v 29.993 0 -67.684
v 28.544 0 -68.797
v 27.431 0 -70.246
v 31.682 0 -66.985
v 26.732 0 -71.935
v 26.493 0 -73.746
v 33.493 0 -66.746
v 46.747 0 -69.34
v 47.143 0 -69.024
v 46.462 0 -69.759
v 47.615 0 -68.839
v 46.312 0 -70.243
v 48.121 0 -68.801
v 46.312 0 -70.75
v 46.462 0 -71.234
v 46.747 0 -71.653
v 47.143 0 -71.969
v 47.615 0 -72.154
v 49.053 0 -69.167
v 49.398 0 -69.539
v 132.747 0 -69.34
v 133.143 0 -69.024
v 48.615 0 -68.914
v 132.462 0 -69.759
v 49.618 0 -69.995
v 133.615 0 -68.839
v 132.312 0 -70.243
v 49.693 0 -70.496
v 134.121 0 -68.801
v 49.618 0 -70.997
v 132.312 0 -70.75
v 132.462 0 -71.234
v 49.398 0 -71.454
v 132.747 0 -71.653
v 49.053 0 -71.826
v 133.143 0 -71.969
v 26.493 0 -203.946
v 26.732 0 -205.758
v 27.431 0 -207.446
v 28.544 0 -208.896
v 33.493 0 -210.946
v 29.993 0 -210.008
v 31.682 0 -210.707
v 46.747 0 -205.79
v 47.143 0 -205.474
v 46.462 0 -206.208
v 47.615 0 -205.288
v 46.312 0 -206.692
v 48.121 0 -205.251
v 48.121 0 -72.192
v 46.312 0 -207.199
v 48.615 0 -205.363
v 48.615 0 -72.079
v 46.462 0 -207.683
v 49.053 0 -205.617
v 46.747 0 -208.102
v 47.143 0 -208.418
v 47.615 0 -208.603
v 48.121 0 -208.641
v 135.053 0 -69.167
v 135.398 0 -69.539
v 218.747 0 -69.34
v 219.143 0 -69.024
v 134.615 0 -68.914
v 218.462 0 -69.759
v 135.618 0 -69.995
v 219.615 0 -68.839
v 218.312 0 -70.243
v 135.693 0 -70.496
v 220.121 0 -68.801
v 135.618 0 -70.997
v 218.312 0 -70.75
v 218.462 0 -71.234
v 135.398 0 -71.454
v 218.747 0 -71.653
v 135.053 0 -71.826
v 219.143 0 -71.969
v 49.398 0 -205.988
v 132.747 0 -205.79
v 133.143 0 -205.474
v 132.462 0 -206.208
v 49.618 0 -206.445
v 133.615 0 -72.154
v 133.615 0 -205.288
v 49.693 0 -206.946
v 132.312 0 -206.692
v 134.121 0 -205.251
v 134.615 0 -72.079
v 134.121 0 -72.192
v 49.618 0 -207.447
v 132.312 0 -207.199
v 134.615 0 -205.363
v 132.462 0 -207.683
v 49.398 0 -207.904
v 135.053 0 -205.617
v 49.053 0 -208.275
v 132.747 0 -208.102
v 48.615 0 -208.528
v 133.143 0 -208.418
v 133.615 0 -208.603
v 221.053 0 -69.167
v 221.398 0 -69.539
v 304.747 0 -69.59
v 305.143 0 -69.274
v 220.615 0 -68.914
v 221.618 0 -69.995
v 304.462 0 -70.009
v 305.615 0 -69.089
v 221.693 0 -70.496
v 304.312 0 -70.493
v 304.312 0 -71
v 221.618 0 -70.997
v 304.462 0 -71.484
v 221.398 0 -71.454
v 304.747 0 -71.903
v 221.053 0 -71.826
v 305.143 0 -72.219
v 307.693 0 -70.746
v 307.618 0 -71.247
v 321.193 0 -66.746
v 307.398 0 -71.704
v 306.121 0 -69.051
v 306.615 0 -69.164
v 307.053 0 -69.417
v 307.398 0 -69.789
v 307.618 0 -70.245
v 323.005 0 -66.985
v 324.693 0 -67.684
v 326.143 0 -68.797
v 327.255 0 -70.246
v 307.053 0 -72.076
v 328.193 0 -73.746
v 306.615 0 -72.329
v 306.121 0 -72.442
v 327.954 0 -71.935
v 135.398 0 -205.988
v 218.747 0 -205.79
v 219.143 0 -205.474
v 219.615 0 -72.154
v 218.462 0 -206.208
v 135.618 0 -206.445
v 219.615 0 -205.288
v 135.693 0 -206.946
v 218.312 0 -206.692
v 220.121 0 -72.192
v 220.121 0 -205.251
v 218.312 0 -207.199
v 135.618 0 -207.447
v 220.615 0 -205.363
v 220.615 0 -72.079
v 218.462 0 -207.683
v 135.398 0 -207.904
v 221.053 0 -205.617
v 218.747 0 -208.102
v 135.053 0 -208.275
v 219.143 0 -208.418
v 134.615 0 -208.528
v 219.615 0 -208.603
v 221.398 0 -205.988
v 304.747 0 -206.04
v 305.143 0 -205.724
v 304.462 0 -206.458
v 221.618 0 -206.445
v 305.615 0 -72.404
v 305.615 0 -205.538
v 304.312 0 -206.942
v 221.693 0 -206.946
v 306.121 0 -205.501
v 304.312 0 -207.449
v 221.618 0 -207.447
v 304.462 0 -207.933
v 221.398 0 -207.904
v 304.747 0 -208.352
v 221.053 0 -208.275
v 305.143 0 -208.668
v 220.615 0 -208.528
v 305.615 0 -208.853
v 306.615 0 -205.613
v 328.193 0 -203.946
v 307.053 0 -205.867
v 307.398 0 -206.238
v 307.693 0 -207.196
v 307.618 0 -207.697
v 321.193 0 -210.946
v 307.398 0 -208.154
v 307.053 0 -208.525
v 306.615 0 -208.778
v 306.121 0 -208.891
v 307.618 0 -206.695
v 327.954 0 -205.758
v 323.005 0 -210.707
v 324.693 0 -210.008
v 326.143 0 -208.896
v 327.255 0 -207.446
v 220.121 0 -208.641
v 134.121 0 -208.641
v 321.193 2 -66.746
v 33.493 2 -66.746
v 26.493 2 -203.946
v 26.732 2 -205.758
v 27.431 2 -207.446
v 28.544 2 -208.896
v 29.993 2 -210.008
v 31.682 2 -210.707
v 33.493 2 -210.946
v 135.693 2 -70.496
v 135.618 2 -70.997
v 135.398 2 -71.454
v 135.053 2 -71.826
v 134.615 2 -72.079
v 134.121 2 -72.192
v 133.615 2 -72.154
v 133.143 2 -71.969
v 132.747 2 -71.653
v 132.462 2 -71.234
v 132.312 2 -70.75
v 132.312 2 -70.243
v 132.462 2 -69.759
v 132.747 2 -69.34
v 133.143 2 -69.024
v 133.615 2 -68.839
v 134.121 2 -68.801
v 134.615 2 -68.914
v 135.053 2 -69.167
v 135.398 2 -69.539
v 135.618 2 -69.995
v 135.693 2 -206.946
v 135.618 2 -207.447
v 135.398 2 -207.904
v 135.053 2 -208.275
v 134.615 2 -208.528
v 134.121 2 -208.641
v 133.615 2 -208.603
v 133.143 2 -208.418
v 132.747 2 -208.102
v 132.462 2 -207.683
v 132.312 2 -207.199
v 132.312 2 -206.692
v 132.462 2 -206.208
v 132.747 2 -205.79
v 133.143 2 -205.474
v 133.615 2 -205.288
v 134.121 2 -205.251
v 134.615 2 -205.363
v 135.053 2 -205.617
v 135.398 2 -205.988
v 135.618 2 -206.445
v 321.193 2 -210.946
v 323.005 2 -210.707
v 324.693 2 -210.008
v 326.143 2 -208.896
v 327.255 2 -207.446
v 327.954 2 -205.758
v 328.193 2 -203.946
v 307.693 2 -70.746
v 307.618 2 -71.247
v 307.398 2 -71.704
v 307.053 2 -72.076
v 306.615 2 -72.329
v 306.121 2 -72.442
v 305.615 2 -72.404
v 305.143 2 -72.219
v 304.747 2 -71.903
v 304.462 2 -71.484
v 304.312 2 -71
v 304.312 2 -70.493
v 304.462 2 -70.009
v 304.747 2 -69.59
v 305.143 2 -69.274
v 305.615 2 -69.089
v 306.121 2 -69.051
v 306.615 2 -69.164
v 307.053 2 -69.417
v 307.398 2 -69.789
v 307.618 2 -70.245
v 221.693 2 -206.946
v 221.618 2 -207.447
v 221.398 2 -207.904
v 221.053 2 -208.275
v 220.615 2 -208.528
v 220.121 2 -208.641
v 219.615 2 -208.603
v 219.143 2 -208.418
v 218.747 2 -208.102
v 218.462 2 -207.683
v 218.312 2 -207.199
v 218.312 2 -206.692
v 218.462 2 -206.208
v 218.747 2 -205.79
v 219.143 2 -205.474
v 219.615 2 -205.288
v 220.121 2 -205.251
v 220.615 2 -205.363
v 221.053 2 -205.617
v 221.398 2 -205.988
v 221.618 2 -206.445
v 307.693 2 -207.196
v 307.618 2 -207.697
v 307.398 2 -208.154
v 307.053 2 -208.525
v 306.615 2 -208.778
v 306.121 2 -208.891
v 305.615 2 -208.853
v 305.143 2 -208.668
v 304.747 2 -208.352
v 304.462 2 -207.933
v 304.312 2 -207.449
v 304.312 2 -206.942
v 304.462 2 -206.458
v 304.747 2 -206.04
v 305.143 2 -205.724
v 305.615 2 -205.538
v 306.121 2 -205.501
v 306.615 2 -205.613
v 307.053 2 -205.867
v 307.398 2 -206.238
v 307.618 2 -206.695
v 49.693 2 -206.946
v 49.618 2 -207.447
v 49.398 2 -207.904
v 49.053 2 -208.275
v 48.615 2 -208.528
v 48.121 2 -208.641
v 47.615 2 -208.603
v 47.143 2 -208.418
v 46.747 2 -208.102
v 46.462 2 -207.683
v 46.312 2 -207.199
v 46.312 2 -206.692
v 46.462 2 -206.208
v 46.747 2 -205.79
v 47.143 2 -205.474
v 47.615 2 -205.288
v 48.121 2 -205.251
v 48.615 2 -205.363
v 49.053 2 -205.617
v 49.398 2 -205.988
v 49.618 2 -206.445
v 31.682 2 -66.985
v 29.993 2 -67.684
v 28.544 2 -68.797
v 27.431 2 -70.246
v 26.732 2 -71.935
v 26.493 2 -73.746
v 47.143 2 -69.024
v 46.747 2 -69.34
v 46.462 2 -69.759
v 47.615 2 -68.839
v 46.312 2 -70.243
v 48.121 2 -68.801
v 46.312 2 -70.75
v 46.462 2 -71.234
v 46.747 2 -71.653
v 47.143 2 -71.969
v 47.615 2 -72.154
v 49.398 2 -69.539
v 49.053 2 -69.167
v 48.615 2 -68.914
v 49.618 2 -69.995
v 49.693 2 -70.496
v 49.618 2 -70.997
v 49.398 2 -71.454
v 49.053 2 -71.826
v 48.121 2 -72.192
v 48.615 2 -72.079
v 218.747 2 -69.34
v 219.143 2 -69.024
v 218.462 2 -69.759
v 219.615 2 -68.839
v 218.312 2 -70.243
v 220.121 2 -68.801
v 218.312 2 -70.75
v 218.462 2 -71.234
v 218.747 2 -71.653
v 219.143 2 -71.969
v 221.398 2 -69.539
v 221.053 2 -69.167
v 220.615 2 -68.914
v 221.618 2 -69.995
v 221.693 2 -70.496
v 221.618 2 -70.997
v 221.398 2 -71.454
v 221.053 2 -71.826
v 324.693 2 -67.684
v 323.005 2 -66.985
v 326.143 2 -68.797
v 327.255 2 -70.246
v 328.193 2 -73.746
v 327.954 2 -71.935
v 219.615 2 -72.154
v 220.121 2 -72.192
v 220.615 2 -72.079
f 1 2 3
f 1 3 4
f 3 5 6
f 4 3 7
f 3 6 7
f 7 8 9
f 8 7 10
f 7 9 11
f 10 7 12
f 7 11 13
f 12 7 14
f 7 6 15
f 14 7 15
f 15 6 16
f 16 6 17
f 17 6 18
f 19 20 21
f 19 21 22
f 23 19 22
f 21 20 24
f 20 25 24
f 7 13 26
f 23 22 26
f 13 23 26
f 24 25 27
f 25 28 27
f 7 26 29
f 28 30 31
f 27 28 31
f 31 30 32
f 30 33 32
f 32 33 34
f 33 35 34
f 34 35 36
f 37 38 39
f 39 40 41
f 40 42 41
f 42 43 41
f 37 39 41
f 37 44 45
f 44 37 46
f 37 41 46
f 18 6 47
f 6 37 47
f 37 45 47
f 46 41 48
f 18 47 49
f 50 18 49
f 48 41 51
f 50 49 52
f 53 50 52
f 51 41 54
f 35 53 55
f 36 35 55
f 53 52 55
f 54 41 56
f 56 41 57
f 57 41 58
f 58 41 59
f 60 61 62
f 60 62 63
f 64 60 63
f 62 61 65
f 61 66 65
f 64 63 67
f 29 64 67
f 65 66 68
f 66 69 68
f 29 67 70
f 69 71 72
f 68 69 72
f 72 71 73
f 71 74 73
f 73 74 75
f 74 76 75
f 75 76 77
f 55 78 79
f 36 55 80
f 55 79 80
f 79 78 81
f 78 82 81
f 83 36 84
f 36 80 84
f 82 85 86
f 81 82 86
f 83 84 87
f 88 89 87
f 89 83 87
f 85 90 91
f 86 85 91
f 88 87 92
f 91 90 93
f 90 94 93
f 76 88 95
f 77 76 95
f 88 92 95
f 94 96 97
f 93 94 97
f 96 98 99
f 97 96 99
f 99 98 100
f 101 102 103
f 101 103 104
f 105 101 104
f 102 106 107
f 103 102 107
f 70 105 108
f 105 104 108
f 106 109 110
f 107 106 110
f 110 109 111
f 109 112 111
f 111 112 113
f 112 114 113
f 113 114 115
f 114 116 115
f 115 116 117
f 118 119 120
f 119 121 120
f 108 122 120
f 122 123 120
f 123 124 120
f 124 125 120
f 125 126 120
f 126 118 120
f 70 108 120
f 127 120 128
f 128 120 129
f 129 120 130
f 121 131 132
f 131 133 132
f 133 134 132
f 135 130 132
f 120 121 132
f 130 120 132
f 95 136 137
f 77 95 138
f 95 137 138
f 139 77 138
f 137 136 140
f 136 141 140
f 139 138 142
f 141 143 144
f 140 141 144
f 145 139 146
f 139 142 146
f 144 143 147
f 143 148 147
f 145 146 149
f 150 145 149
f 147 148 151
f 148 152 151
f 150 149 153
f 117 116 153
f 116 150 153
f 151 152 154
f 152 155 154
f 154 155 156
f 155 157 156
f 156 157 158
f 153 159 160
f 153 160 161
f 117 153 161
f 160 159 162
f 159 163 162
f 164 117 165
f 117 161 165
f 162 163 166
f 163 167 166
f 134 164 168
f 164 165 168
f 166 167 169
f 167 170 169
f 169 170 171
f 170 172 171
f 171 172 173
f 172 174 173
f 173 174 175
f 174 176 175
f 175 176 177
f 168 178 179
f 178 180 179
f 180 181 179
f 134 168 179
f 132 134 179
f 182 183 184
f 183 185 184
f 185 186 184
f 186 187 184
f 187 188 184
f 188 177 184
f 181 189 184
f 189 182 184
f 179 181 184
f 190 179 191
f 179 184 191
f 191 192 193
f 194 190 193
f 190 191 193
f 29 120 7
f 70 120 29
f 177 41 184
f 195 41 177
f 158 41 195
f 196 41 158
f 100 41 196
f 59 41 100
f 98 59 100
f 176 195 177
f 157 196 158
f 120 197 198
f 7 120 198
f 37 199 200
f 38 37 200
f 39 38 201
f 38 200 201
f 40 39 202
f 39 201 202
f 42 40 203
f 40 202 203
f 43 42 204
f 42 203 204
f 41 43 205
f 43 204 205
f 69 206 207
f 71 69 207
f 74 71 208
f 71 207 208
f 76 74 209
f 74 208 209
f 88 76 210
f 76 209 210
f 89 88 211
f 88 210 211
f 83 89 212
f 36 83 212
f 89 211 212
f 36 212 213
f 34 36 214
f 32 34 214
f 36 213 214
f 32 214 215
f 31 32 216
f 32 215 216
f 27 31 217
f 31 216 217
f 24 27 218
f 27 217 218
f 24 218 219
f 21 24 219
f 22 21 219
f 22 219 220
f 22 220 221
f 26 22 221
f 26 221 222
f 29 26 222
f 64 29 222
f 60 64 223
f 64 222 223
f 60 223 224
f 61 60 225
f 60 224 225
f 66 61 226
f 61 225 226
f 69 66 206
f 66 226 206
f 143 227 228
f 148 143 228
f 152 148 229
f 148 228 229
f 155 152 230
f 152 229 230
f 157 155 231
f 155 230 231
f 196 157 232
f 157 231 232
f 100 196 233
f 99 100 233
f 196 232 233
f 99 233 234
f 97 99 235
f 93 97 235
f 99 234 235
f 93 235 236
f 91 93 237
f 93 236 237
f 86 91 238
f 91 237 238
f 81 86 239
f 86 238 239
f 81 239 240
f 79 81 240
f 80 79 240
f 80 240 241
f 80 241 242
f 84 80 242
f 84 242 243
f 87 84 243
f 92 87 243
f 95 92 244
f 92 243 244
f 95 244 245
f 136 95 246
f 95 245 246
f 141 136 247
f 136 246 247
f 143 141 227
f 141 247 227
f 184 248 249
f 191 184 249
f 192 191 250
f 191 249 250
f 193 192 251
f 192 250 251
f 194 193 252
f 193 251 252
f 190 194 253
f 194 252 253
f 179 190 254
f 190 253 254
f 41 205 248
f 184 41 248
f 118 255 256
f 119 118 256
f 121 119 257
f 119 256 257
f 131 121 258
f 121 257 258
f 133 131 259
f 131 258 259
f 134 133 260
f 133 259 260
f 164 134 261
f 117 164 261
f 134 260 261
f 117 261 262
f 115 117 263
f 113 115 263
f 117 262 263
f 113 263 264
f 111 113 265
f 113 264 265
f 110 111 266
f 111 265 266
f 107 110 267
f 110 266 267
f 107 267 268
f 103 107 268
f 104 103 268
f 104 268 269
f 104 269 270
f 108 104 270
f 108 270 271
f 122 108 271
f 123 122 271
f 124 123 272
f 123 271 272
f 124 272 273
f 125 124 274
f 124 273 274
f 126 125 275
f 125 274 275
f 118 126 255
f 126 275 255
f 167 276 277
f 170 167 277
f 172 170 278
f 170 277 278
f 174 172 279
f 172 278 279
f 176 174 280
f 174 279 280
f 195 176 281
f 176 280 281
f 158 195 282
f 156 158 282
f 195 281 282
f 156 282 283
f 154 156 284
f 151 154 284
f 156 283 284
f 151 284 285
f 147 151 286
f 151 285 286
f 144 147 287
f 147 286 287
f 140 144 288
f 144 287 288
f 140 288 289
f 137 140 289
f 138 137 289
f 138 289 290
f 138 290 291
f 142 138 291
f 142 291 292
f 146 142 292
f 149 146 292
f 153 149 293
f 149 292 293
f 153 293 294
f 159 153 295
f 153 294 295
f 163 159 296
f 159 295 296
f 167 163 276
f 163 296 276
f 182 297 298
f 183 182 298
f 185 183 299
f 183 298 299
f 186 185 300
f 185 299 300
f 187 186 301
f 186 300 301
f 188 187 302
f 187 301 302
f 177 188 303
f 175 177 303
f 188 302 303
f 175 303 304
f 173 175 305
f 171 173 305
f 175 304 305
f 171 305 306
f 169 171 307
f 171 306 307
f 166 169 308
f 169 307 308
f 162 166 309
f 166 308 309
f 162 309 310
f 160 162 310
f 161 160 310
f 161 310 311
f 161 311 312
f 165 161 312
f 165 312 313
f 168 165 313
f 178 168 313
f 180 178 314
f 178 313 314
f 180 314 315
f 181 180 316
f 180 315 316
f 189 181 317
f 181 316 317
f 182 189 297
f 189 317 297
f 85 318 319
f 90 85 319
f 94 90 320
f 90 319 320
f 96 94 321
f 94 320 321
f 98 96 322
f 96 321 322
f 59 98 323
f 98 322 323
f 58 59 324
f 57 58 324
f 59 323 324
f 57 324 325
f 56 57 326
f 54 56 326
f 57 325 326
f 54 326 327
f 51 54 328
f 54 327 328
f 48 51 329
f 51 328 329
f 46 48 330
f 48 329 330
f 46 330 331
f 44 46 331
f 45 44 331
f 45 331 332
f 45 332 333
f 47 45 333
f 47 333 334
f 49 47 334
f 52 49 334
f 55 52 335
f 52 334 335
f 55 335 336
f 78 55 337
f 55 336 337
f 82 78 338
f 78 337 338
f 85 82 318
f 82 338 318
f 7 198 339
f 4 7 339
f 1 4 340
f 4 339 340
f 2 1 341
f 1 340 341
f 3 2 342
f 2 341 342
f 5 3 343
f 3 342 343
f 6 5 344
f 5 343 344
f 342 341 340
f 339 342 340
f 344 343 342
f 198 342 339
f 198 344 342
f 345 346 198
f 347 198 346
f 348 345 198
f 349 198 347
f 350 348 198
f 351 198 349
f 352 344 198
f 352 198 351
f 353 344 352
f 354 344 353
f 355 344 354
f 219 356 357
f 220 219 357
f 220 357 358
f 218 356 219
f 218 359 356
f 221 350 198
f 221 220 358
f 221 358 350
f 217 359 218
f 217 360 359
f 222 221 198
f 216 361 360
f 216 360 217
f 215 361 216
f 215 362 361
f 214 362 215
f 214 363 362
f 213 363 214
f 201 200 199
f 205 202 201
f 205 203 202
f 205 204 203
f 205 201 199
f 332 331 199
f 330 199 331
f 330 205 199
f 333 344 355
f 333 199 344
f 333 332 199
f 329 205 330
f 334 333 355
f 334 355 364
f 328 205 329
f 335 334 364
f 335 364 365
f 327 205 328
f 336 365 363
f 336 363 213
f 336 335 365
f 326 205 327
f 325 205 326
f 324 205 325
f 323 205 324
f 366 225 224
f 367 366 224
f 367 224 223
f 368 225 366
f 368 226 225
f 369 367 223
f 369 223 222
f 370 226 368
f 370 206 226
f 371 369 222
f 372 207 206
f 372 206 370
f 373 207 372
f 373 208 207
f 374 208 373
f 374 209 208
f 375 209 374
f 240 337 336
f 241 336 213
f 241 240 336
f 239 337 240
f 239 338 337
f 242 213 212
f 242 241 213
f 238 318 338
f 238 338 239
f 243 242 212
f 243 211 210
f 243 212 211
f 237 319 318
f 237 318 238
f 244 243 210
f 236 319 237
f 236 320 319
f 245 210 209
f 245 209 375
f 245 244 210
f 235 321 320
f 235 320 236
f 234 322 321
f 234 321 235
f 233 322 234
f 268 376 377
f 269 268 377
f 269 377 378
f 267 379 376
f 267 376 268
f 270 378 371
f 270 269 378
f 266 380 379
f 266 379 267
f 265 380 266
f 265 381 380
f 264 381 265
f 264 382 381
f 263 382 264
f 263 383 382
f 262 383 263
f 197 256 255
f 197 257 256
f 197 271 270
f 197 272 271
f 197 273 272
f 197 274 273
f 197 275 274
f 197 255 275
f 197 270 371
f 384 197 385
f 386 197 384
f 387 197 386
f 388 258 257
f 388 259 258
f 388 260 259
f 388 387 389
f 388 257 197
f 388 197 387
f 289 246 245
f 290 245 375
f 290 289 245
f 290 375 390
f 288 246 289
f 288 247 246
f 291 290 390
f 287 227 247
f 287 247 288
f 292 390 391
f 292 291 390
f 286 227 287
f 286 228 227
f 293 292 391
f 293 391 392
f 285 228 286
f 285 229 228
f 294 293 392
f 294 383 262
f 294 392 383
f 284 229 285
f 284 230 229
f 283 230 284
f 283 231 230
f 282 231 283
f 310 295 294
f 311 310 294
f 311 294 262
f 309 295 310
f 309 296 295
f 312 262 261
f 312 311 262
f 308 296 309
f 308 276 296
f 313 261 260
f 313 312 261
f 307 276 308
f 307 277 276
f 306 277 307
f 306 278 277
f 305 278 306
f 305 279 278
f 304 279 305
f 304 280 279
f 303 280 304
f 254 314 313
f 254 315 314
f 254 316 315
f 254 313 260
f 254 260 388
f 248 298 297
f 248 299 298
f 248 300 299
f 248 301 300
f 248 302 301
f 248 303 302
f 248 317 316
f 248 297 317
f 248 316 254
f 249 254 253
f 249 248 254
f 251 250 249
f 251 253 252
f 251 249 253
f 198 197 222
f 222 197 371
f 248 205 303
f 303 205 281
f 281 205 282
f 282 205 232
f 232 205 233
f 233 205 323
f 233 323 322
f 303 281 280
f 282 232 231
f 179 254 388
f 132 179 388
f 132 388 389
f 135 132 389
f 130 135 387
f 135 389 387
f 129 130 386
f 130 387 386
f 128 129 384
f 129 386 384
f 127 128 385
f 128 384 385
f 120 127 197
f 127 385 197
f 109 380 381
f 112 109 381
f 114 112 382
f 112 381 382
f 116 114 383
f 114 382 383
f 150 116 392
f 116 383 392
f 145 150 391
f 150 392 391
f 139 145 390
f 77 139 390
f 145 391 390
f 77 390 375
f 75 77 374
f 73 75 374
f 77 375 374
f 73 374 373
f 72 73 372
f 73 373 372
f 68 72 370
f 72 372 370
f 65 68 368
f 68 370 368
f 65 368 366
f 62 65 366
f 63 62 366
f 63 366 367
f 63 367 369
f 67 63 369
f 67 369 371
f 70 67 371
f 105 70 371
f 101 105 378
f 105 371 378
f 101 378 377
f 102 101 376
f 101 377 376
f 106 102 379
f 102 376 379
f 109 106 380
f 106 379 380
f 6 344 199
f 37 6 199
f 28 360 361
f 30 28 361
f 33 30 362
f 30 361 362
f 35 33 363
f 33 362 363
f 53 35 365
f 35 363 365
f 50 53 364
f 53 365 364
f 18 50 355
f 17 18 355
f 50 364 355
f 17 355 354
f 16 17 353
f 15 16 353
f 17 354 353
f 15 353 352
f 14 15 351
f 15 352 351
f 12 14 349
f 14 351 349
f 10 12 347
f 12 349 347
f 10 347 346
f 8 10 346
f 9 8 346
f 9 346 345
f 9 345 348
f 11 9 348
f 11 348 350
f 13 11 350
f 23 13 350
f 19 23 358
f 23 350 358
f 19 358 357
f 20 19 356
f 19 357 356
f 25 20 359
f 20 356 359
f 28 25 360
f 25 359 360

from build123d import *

# Parameters (mm, degrees)
SKETCH1_W           = 350
SKETCH1_H           = 250
BOSS_EXTRUDE1_DEPTH = 2
SKETCH4_OUTSIDE_W   = 438.024
SKETCH4_OUTSIDE_H   = 338.024
SKETCH4_OUTSIDE_R   = 1.7
CUT_EXTRUDE1_DEPTH  = 2


with BuildPart() as part:
    # Sketch1 → Boss-Extrude1 (new body)
    with BuildSketch(Plane(origin=(0, 0, 0), x_dir=(1, 0, 0), z_dir=(0, 1, 0))):
        with Locations((175, 125)):
            Rectangle(SKETCH1_W, SKETCH1_H)
    extrude(amount=BOSS_EXTRUDE1_DEPTH)

    # Sketch4 outside → Cut-Extrude1 (cut)
    with BuildSketch(Plane(origin=(0, 2, 0), x_dir=(1, 0, 0), z_dir=(0, 1, 0))):
        with Locations((175, 125)):
            Rectangle(SKETCH4_OUTSIDE_W, SKETCH4_OUTSIDE_H)
        with BuildLine():
            Line((26.493493562, 73.746405702), (26.493493562, 203.945865702))
            ThreePointArc((26.493493562, 203.945865702), (28.543746093, 208.895613171), (33.493493562, 210.945865702))
            Line((33.493493562, 210.945865702), (321.192843562, 210.945865702))
            ThreePointArc((321.192843562, 210.945865702), (326.14259103, 208.895613171), (328.192843562, 203.945865702))
            Line((328.192843562, 203.945865702), (328.192843562, 73.746405702))
            ThreePointArc((328.192843562, 73.746405702), (326.14259103, 68.796658234), (321.192843562, 66.746405702))
            Line((321.192843562, 66.746405702), (33.493493562, 66.746405702))
            ThreePointArc((33.493493562, 66.746405702), (28.543746093, 68.796658234), (26.493493562, 73.746405702))
        make_face(mode=Mode.SUBTRACT)
        with Locations((305.993493562, 70.746405702)):
            Circle(SKETCH4_OUTSIDE_R)
        with Locations((219.993493562, 70.496405702)):
            Circle(SKETCH4_OUTSIDE_R)
        with Locations((47.993493562, 70.496405702)):
            Circle(SKETCH4_OUTSIDE_R)
        with Locations((133.993493562, 70.496405702)):
            Circle(SKETCH4_OUTSIDE_R)
        with Locations((305.993493562, 207.195865702)):
            Circle(SKETCH4_OUTSIDE_R)
        with Locations((219.993493562, 206.945865702)):
            Circle(SKETCH4_OUTSIDE_R)
        with Locations((47.993493562, 206.945865702)):
            Circle(SKETCH4_OUTSIDE_R)
        with Locations((133.993493562, 206.945865702)):
            Circle(SKETCH4_OUTSIDE_R)
    extrude(amount=-CUT_EXTRUDE1_DEPTH, mode=Mode.SUBTRACT)


solid = part.part
